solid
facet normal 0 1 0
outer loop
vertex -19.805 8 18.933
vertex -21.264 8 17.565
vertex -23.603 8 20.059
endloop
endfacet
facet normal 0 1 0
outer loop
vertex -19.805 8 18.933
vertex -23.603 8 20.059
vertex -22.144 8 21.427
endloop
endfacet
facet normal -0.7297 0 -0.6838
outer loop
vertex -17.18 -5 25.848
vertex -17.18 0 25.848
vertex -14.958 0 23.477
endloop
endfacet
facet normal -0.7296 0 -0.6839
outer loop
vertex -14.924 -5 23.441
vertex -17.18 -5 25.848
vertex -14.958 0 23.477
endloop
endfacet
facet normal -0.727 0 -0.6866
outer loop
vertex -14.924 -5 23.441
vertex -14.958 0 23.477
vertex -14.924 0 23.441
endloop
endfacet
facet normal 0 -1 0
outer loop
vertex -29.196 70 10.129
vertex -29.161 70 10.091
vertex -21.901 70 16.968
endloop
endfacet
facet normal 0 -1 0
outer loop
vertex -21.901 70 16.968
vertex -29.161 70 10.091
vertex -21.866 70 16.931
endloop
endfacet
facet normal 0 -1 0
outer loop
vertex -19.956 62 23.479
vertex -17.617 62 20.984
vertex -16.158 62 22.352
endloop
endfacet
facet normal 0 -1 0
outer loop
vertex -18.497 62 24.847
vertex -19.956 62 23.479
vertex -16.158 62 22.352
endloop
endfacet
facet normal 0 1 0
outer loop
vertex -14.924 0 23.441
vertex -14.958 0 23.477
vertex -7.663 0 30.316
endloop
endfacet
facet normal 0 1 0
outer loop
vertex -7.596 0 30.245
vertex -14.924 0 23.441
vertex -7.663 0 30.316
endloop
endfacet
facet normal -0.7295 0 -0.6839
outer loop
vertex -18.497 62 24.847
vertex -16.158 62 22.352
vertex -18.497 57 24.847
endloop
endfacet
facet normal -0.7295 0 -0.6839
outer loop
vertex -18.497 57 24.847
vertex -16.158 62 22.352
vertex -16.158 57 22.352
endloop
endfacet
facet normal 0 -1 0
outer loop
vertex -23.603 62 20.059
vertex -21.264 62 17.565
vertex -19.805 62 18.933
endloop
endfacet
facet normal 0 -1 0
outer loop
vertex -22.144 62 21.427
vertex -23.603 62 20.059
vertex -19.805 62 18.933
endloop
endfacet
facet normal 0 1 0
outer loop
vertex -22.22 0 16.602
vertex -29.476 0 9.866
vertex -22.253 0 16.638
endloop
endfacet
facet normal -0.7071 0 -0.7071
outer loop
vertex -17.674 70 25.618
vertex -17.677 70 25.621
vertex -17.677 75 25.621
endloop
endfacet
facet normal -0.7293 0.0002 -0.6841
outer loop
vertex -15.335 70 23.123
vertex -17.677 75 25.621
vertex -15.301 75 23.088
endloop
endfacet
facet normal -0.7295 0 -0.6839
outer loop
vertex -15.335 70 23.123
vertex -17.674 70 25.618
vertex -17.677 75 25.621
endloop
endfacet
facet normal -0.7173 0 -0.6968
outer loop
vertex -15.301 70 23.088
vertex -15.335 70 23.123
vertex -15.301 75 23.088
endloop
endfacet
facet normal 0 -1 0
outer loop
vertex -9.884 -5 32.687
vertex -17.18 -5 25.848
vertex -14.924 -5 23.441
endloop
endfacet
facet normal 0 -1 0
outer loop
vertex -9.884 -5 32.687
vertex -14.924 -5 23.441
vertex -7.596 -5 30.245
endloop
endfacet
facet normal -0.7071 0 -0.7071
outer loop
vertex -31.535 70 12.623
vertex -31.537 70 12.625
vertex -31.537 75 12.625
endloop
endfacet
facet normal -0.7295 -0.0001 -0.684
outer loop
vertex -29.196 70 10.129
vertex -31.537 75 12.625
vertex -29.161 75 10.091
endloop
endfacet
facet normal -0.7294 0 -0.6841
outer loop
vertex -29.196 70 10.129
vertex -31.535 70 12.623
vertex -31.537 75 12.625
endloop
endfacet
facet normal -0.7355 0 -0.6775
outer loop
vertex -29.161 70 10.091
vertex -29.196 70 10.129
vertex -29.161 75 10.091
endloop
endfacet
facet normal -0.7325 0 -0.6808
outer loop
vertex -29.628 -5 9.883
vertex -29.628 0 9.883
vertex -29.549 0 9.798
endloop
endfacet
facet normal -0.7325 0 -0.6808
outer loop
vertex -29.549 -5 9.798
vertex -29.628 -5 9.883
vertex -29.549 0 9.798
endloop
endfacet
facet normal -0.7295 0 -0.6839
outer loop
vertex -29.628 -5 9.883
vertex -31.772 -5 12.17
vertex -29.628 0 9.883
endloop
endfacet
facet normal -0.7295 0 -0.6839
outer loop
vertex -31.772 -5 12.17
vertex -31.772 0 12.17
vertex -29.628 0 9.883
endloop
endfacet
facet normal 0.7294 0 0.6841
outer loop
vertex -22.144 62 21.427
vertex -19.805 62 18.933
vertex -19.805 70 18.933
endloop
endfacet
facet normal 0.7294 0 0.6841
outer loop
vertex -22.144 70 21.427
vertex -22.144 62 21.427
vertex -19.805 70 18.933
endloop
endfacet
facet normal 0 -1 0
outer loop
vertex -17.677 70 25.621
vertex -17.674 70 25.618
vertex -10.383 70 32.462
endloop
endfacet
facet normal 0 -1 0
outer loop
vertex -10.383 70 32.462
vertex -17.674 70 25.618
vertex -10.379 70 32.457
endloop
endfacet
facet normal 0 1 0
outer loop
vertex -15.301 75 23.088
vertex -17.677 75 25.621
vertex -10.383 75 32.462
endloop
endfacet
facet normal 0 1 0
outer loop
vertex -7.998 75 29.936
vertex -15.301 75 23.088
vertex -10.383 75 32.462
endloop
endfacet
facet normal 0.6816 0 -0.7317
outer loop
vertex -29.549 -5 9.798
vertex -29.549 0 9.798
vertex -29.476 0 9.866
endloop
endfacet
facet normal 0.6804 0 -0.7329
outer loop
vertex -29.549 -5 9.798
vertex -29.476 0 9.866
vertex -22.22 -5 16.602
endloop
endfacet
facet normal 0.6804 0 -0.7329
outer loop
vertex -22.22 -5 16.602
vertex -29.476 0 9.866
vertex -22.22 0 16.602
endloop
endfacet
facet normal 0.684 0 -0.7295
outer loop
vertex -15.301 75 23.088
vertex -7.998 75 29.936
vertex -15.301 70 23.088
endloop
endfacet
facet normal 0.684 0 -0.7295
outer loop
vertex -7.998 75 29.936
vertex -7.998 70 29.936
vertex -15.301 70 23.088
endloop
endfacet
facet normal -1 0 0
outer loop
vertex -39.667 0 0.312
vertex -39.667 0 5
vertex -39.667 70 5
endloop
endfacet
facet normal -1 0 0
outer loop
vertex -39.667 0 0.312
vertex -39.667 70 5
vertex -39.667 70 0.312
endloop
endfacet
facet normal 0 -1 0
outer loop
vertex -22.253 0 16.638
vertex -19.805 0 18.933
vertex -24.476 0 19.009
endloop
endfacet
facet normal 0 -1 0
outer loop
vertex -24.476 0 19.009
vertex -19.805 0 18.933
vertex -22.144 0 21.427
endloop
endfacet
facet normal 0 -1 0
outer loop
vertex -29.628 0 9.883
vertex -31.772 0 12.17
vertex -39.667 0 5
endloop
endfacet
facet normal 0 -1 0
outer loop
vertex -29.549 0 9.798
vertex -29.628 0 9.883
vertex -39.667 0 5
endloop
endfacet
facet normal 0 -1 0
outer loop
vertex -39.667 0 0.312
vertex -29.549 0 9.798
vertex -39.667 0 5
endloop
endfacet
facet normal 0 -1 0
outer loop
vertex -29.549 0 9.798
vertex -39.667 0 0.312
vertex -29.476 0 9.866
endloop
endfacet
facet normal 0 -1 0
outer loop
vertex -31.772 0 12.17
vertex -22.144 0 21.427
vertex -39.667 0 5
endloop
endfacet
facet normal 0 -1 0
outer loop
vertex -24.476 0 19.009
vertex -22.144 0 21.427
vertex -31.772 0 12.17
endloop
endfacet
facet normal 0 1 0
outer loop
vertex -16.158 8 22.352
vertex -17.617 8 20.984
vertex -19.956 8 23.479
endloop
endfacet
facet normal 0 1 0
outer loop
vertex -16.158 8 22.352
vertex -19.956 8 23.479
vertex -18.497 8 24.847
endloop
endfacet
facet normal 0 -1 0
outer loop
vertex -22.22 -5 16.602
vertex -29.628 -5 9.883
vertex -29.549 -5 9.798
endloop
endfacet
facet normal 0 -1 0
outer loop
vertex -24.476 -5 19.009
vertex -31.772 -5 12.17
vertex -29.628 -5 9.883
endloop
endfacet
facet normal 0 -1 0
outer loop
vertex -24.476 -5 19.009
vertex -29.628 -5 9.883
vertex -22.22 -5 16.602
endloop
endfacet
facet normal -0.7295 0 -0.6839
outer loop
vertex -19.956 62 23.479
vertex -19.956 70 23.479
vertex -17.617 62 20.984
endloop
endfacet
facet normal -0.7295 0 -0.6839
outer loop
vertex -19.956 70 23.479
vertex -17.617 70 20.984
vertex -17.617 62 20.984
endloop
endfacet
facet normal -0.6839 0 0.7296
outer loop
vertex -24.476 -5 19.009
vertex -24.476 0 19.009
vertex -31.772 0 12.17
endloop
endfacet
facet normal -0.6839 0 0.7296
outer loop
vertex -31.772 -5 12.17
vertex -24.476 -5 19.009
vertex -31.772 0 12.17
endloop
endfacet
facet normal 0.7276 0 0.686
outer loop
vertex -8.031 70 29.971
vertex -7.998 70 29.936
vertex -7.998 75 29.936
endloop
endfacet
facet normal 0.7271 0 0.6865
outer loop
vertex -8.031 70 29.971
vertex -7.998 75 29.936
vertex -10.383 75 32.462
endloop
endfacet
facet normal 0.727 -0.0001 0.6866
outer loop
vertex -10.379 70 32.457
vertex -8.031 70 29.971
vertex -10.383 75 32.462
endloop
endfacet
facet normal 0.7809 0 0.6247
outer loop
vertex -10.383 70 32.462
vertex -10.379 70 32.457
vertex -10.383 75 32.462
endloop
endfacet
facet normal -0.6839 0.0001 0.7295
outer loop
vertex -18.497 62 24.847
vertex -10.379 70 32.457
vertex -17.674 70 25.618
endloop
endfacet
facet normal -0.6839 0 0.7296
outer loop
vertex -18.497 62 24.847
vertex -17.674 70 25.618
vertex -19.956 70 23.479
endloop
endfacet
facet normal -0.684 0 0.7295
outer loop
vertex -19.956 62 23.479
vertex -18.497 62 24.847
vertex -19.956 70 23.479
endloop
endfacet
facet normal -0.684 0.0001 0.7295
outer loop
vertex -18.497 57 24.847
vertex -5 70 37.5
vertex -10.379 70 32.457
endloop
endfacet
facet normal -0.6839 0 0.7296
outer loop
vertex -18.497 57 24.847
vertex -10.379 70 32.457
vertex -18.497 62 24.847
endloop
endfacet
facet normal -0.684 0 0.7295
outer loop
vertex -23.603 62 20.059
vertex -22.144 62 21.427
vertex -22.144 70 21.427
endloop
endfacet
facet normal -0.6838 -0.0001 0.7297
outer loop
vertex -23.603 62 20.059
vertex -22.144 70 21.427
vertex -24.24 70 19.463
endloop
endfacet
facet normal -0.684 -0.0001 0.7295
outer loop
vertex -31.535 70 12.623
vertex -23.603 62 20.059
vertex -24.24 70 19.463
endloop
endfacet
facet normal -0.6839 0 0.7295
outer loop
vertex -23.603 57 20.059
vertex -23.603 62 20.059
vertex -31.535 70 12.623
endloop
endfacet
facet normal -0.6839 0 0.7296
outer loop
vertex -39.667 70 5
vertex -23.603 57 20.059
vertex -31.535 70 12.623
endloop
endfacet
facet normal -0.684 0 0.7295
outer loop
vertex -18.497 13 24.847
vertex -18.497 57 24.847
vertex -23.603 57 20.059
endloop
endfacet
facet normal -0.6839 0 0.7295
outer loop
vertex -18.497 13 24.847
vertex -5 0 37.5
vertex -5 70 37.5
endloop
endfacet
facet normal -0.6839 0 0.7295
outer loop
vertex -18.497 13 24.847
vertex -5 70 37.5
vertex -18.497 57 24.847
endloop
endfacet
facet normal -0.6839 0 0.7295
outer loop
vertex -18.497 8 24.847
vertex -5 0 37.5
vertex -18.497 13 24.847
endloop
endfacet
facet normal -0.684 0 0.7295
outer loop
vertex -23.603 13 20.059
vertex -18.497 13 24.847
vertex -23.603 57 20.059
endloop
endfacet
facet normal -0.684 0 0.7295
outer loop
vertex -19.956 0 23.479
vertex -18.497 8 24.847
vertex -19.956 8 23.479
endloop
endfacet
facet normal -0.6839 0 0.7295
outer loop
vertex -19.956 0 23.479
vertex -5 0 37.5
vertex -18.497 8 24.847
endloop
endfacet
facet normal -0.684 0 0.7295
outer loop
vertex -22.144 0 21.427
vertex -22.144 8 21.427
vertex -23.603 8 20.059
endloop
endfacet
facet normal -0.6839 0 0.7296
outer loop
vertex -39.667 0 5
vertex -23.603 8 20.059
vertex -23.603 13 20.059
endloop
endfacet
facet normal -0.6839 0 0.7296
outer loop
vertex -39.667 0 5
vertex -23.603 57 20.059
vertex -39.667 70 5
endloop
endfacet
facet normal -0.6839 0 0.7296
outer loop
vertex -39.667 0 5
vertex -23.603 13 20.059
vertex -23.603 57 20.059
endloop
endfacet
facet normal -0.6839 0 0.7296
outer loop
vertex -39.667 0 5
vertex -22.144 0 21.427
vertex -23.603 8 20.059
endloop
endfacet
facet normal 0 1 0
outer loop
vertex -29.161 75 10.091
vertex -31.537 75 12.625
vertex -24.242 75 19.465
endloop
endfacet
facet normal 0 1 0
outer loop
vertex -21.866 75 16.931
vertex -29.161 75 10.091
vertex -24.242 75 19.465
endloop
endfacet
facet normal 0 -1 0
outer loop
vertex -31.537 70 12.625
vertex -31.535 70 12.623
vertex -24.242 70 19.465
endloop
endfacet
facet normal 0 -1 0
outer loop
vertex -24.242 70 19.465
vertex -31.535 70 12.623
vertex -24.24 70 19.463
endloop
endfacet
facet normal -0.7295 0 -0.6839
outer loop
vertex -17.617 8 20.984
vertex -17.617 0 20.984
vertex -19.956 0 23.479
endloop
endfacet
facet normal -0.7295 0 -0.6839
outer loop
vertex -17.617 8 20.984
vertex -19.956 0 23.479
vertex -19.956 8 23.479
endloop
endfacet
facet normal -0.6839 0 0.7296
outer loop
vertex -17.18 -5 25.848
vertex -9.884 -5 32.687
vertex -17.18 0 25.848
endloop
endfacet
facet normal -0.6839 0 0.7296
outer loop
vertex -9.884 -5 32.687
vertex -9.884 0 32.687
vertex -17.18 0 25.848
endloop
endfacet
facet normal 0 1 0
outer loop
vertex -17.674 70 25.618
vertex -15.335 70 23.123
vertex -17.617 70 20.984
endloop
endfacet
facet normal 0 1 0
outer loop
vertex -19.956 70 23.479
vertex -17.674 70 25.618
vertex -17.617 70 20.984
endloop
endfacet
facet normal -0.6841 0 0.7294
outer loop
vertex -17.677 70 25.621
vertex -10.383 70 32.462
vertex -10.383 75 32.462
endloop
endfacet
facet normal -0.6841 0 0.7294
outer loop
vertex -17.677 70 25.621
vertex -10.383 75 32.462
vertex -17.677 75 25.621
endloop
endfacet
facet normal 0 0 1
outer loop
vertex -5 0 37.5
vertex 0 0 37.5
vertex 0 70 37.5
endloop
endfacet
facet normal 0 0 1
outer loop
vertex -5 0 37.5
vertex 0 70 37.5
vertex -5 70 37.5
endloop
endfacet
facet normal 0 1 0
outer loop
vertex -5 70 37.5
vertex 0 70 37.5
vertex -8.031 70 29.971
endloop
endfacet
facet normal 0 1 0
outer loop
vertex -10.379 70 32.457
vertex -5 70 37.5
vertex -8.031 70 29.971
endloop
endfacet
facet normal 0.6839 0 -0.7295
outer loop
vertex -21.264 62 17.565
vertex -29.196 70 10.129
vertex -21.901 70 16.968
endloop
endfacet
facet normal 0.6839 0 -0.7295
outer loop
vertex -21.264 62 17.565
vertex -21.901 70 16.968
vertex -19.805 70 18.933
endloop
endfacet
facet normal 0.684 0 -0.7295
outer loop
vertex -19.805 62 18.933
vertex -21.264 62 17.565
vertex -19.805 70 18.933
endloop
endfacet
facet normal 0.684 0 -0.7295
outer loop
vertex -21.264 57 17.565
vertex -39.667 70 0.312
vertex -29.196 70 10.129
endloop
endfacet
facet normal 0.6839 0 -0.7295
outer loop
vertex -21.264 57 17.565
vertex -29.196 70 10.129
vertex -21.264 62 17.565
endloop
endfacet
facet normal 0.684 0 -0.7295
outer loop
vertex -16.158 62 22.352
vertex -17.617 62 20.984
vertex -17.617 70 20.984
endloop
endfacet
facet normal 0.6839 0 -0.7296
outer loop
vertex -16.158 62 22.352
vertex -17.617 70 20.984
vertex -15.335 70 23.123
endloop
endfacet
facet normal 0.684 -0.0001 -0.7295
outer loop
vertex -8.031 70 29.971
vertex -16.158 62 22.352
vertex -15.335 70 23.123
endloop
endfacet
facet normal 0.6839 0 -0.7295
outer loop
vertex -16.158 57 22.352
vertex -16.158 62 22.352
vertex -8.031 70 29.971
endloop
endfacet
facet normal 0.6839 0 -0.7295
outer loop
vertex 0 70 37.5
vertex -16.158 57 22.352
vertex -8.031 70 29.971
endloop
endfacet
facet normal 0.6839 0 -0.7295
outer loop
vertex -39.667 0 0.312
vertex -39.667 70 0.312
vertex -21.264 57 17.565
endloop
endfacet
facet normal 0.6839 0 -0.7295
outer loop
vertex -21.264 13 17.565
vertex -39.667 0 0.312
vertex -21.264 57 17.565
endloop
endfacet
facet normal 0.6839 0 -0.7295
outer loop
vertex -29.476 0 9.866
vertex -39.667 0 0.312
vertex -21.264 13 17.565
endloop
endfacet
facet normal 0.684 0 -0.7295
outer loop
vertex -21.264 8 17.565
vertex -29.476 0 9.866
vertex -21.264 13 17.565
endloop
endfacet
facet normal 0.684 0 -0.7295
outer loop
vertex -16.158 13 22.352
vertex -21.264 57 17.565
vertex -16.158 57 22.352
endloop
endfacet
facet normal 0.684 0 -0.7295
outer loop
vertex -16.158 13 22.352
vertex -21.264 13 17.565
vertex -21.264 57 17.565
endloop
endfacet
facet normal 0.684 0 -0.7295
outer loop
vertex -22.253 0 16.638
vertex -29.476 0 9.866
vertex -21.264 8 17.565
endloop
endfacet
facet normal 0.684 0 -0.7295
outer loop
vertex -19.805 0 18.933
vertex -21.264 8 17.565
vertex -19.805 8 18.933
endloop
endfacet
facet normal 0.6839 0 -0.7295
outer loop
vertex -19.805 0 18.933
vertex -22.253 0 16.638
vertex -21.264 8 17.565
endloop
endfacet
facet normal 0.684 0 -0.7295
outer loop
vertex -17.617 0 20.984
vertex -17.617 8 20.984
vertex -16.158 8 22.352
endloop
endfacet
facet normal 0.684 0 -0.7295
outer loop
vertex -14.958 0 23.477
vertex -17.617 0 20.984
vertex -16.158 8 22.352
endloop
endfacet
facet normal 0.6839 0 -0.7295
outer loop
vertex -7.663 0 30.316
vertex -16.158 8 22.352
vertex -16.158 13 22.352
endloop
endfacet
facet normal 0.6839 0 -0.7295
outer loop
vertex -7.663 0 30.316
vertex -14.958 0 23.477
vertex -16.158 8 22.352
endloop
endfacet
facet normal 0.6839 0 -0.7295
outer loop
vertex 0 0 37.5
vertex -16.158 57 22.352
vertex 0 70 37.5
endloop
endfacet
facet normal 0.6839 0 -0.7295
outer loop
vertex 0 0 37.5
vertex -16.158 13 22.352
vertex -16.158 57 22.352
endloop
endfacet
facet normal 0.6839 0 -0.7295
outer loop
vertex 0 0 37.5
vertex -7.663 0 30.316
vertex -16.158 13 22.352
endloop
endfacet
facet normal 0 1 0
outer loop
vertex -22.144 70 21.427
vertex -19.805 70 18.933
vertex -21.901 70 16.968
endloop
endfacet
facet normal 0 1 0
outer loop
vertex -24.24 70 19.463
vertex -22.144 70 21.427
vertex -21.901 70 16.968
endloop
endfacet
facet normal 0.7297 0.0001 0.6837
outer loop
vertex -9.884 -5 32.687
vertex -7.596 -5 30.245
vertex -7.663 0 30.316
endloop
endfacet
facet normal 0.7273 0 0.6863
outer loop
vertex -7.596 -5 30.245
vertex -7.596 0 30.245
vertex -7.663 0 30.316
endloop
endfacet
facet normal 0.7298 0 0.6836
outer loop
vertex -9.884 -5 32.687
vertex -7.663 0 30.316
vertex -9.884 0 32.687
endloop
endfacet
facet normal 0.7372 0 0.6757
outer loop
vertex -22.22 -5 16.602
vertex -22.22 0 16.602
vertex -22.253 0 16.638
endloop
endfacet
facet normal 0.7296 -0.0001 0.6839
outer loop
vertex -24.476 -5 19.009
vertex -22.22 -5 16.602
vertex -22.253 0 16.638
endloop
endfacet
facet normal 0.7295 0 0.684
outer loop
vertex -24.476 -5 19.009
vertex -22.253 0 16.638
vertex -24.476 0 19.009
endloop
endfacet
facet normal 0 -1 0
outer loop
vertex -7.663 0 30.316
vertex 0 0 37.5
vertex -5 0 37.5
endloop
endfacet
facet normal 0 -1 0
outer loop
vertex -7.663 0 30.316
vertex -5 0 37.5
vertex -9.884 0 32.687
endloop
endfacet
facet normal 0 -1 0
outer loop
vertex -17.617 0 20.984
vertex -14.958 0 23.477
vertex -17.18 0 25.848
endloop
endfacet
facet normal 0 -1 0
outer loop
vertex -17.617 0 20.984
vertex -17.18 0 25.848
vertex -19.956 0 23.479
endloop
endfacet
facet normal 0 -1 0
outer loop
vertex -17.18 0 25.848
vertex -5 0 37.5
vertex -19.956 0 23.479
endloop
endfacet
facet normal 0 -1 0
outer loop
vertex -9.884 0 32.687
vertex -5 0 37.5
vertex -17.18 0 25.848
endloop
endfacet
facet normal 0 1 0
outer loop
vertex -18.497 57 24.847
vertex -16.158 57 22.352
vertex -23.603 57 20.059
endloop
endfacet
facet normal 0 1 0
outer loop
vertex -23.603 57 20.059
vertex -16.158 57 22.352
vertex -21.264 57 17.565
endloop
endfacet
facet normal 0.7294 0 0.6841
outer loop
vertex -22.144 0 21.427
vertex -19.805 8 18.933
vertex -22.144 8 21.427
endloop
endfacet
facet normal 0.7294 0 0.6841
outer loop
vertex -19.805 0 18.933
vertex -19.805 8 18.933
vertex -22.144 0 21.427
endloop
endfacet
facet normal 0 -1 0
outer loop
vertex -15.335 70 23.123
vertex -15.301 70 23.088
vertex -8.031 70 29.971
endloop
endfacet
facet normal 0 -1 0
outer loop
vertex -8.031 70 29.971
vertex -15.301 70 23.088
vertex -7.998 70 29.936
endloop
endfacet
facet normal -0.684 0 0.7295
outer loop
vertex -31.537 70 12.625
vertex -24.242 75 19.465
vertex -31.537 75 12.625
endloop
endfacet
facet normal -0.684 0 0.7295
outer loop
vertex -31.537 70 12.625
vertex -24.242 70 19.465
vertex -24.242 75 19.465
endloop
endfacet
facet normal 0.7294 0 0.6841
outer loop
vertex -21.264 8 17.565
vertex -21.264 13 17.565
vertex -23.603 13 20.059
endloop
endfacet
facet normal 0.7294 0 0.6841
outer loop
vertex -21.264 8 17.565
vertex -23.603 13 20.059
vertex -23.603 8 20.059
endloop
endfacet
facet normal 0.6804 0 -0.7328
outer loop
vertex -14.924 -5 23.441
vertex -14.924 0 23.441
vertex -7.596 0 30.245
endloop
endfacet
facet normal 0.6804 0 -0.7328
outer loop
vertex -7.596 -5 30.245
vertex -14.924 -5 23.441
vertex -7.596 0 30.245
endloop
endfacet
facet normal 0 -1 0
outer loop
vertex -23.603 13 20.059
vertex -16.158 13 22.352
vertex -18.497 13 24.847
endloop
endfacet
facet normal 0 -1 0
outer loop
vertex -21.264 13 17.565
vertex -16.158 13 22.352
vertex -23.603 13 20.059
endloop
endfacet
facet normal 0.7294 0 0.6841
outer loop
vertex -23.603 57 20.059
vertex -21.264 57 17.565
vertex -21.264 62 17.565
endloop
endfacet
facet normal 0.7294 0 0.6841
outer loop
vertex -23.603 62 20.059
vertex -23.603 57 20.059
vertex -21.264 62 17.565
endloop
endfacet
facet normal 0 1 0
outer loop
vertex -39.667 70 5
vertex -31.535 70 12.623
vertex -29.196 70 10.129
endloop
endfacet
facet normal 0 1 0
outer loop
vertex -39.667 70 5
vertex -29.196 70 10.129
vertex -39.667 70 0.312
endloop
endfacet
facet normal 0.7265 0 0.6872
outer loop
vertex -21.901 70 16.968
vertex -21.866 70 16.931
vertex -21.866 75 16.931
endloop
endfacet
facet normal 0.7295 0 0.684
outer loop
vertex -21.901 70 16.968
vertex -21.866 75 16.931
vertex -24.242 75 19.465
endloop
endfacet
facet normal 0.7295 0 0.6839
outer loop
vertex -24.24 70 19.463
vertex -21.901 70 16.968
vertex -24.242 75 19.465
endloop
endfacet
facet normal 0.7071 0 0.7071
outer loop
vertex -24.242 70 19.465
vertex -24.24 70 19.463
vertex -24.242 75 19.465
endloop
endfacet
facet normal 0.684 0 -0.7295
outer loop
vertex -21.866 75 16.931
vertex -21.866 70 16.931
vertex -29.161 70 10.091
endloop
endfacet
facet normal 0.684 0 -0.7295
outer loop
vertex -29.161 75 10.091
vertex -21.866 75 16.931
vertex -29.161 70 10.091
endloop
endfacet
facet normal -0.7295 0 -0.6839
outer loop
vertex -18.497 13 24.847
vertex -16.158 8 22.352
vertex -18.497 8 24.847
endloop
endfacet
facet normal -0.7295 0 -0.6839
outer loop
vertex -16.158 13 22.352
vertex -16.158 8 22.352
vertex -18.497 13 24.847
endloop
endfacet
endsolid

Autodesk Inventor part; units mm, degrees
ref_plane "YZ Plane" through (0, 0, 0) normal (1, 0, 0) x (0, 1, 0)
ref_plane "XZ Plane" through (0, 0, 0) normal (0, 1, 0) x (-1, 0, 0)
ref_plane "XY Plane" through (0, 0, 0) normal (0, 0, 1) x (1, 0, 0)
sketch "Sketch1" plane through (0, 0, 0) normal (0, 1, 0) x (-1, 0, 0)
  line L0 (39.6667, 0.3125) -> (0, 37.5)
  line L1 (0, 37.5) -> (5, 37.5)
  line L2 (5, 37.5) -> (39.6667, 5)
  line L3 (39.6667, 5) -> (39.6667, 0.3125)
  point P0 (0, 0)
  dimension "d2" = 5
  dimension "d46" = 32.5
extrude "Extrusion1" add sketch "Sketch1" along normal blind 70
sketch "Sketch2" plane through (-39.6667, 0, 0.3125) normal (0.6839, 0, -0.7295) x (-0.7295, 0, -0.6839)
  line L0 (-54.3406, 0) -> (-29.3406, 0)
  line L1 (-29.3406, 0) -> (-34.3406, 0)
  line L2 (-34.3406, 0) -> (-24.3406, 0)
  line L3 (-28.7246, 0) -> (-30.2246, 0)
  line L4 (-30.2246, 0) -> (-30.2246, 8)
  line L5 (-30.2246, 8) -> (-32.2246, 8)
  line L6 (-32.2246, 8) -> (-32.2246, 13)
  line L7 (-32.2246, 13) -> (-25.2246, 13)
  line L8 (-25.2246, 13) -> (-25.2246, 8)
  line L9 (-25.2246, 8) -> (-27.2246, 8)
  line L10 (-27.2246, 8) -> (-27.2246, 0)
  line L11 (-54.3406, 0) -> (-54.3406, 35)
  line L12 (-54.3406, 35) -> (0.1481, 35)
  line L13 (0.1481, 35) -> (0.1481, 0)
  line L14 (-29.3406, 70) -> (-34.3406, 70)
  line L15 (-34.3406, 70) -> (-24.3406, 70)
  line L16 (-28.7246, 70) -> (-30.2246, 70)
  line L17 (-30.2246, 70) -> (-30.2246, 62)
  line L18 (-30.2246, 62) -> (-32.2246, 62)
  line L19 (-32.2246, 62) -> (-32.2246, 57)
  line L20 (-32.2246, 57) -> (-25.2246, 57)
  line L21 (-25.2246, 57) -> (-25.2246, 62)
  line L22 (-25.2246, 62) -> (-27.2246, 62)
  line L23 (-27.2246, 62) -> (-27.2246, 70)
  dimension "d7" = 25
  dimension "d8" = 5
  dimension "d9" = 10
  dimension "d10" = 1.5
  dimension "d11" = 8
  dimension "d12" = 2
  dimension "d13" = 5
  dimension "d14" = 7
  dimension "d15" = 2
  dimension "d16" = 35
extrude "Extrusion2" cut sketch "Sketch2" against normal blind 5 contours L4 L5 L6 L7 L8 L9 L10 L2 L0
extrude "Extrusion3" cut sketch "Sketch2" against normal blind 5 contours L15 L23 L22 L21 L20 L19 L18 L17 L14
sketch "Sketch3" plane through (0, 70, 0) normal (0, 1, 0) x (1, 0, 0)
  line L0 (0, -37.4883) -> (-7.9979, -29.936)
  line L1 (0, -37.4883) -> (-5.022, -37.4883)
  line L2 (-5.022, -37.4883) -> (-45.0001, 0)
  line L3 (0, -37.4883) -> (-7.9979, -29.936)
  line L4 (-7.9979, -29.936) -> (-10.3827, -32.4615)
  line L5 (-10.3827, -32.4615) -> (-16.9476, -26.3054)
  line L6 (-21.8663, -16.9314) -> (-24.2422, -19.4651)
  line L7 (-24.2422, -19.4651) -> (-31.5368, -12.6248)
  line L8 (-31.5368, -12.6248) -> (-29.1608, -10.0911)
  line L9 (-21.8663, -16.9314) -> (-29.1608, -10.0911)
  line L10 (-10.3827, -32.4615) -> (-17.6772, -25.6212)
  line L11 (-7.9979, -29.936) -> (-21.8663, -16.9314)
  line L12 (-17.6772, -25.6212) -> (-15.3013, -23.0875)
  point P0 (0, 0)
  dimension "d25" = 90
  dimension "d28" = 10
  dimension "d32" = 18.4566
  dimension "d33" = 10
extrude "Extrusion4" add sketch "Sketch3" along normal blind 5 contours L4 L2 L12 L11 | L6 L2 L8 L9
sketch "Sketch4" plane through (0, 0, 0) normal (0, -1, 0) x (1, 0, 0)
  line L0 (0.1144, 37.3726) -> (-7.596, 30.2452)
  line L1 (0.1144, 37.3726) -> (-4.8856, 37.3726)
  line L2 (-4.8856, 37.3726) -> (-44.8855, -0.1225)
  line L3 (-4.8856, 37.3726) -> (-9.8845, 32.6867)
  line L4 (-7.596, 30.2452) -> (-9.8845, 32.6867)
  line L5 (-9.8845, 32.6867) -> (-17.1803, 25.8478)
  line L6 (-17.1803, 25.8478) -> (-14.9244, 23.4411)
  line L7 (-14.9244, 23.4411) -> (-22.2202, 16.6022)
  line L8 (-22.2202, 16.6022) -> (-24.4761, 19.0088)
  line L9 (-24.4761, 19.0088) -> (-31.7719, 12.1699)
  line L10 (-31.7719, 12.1699) -> (-29.6284, 9.8832)
  line L11 (-29.6284, 9.8832) -> (-29.549, 9.7985)
  line L12 (-29.549, 9.7985) -> (-29.5486, 9.7981)
  line L13 (-29.5486, 9.7981) -> (-22.2202, 16.6022)
  line L14 (-14.9244, 23.4411) -> (-7.596, 30.2452)
  point P0 (0, 0)
extrude "Extrusion5" add sketch "Sketch4" along normal blind 5 contours L14 L6 L2 L4 | L13 L11 L10 L2 L8
properties part number "lat_front_mdf2"
